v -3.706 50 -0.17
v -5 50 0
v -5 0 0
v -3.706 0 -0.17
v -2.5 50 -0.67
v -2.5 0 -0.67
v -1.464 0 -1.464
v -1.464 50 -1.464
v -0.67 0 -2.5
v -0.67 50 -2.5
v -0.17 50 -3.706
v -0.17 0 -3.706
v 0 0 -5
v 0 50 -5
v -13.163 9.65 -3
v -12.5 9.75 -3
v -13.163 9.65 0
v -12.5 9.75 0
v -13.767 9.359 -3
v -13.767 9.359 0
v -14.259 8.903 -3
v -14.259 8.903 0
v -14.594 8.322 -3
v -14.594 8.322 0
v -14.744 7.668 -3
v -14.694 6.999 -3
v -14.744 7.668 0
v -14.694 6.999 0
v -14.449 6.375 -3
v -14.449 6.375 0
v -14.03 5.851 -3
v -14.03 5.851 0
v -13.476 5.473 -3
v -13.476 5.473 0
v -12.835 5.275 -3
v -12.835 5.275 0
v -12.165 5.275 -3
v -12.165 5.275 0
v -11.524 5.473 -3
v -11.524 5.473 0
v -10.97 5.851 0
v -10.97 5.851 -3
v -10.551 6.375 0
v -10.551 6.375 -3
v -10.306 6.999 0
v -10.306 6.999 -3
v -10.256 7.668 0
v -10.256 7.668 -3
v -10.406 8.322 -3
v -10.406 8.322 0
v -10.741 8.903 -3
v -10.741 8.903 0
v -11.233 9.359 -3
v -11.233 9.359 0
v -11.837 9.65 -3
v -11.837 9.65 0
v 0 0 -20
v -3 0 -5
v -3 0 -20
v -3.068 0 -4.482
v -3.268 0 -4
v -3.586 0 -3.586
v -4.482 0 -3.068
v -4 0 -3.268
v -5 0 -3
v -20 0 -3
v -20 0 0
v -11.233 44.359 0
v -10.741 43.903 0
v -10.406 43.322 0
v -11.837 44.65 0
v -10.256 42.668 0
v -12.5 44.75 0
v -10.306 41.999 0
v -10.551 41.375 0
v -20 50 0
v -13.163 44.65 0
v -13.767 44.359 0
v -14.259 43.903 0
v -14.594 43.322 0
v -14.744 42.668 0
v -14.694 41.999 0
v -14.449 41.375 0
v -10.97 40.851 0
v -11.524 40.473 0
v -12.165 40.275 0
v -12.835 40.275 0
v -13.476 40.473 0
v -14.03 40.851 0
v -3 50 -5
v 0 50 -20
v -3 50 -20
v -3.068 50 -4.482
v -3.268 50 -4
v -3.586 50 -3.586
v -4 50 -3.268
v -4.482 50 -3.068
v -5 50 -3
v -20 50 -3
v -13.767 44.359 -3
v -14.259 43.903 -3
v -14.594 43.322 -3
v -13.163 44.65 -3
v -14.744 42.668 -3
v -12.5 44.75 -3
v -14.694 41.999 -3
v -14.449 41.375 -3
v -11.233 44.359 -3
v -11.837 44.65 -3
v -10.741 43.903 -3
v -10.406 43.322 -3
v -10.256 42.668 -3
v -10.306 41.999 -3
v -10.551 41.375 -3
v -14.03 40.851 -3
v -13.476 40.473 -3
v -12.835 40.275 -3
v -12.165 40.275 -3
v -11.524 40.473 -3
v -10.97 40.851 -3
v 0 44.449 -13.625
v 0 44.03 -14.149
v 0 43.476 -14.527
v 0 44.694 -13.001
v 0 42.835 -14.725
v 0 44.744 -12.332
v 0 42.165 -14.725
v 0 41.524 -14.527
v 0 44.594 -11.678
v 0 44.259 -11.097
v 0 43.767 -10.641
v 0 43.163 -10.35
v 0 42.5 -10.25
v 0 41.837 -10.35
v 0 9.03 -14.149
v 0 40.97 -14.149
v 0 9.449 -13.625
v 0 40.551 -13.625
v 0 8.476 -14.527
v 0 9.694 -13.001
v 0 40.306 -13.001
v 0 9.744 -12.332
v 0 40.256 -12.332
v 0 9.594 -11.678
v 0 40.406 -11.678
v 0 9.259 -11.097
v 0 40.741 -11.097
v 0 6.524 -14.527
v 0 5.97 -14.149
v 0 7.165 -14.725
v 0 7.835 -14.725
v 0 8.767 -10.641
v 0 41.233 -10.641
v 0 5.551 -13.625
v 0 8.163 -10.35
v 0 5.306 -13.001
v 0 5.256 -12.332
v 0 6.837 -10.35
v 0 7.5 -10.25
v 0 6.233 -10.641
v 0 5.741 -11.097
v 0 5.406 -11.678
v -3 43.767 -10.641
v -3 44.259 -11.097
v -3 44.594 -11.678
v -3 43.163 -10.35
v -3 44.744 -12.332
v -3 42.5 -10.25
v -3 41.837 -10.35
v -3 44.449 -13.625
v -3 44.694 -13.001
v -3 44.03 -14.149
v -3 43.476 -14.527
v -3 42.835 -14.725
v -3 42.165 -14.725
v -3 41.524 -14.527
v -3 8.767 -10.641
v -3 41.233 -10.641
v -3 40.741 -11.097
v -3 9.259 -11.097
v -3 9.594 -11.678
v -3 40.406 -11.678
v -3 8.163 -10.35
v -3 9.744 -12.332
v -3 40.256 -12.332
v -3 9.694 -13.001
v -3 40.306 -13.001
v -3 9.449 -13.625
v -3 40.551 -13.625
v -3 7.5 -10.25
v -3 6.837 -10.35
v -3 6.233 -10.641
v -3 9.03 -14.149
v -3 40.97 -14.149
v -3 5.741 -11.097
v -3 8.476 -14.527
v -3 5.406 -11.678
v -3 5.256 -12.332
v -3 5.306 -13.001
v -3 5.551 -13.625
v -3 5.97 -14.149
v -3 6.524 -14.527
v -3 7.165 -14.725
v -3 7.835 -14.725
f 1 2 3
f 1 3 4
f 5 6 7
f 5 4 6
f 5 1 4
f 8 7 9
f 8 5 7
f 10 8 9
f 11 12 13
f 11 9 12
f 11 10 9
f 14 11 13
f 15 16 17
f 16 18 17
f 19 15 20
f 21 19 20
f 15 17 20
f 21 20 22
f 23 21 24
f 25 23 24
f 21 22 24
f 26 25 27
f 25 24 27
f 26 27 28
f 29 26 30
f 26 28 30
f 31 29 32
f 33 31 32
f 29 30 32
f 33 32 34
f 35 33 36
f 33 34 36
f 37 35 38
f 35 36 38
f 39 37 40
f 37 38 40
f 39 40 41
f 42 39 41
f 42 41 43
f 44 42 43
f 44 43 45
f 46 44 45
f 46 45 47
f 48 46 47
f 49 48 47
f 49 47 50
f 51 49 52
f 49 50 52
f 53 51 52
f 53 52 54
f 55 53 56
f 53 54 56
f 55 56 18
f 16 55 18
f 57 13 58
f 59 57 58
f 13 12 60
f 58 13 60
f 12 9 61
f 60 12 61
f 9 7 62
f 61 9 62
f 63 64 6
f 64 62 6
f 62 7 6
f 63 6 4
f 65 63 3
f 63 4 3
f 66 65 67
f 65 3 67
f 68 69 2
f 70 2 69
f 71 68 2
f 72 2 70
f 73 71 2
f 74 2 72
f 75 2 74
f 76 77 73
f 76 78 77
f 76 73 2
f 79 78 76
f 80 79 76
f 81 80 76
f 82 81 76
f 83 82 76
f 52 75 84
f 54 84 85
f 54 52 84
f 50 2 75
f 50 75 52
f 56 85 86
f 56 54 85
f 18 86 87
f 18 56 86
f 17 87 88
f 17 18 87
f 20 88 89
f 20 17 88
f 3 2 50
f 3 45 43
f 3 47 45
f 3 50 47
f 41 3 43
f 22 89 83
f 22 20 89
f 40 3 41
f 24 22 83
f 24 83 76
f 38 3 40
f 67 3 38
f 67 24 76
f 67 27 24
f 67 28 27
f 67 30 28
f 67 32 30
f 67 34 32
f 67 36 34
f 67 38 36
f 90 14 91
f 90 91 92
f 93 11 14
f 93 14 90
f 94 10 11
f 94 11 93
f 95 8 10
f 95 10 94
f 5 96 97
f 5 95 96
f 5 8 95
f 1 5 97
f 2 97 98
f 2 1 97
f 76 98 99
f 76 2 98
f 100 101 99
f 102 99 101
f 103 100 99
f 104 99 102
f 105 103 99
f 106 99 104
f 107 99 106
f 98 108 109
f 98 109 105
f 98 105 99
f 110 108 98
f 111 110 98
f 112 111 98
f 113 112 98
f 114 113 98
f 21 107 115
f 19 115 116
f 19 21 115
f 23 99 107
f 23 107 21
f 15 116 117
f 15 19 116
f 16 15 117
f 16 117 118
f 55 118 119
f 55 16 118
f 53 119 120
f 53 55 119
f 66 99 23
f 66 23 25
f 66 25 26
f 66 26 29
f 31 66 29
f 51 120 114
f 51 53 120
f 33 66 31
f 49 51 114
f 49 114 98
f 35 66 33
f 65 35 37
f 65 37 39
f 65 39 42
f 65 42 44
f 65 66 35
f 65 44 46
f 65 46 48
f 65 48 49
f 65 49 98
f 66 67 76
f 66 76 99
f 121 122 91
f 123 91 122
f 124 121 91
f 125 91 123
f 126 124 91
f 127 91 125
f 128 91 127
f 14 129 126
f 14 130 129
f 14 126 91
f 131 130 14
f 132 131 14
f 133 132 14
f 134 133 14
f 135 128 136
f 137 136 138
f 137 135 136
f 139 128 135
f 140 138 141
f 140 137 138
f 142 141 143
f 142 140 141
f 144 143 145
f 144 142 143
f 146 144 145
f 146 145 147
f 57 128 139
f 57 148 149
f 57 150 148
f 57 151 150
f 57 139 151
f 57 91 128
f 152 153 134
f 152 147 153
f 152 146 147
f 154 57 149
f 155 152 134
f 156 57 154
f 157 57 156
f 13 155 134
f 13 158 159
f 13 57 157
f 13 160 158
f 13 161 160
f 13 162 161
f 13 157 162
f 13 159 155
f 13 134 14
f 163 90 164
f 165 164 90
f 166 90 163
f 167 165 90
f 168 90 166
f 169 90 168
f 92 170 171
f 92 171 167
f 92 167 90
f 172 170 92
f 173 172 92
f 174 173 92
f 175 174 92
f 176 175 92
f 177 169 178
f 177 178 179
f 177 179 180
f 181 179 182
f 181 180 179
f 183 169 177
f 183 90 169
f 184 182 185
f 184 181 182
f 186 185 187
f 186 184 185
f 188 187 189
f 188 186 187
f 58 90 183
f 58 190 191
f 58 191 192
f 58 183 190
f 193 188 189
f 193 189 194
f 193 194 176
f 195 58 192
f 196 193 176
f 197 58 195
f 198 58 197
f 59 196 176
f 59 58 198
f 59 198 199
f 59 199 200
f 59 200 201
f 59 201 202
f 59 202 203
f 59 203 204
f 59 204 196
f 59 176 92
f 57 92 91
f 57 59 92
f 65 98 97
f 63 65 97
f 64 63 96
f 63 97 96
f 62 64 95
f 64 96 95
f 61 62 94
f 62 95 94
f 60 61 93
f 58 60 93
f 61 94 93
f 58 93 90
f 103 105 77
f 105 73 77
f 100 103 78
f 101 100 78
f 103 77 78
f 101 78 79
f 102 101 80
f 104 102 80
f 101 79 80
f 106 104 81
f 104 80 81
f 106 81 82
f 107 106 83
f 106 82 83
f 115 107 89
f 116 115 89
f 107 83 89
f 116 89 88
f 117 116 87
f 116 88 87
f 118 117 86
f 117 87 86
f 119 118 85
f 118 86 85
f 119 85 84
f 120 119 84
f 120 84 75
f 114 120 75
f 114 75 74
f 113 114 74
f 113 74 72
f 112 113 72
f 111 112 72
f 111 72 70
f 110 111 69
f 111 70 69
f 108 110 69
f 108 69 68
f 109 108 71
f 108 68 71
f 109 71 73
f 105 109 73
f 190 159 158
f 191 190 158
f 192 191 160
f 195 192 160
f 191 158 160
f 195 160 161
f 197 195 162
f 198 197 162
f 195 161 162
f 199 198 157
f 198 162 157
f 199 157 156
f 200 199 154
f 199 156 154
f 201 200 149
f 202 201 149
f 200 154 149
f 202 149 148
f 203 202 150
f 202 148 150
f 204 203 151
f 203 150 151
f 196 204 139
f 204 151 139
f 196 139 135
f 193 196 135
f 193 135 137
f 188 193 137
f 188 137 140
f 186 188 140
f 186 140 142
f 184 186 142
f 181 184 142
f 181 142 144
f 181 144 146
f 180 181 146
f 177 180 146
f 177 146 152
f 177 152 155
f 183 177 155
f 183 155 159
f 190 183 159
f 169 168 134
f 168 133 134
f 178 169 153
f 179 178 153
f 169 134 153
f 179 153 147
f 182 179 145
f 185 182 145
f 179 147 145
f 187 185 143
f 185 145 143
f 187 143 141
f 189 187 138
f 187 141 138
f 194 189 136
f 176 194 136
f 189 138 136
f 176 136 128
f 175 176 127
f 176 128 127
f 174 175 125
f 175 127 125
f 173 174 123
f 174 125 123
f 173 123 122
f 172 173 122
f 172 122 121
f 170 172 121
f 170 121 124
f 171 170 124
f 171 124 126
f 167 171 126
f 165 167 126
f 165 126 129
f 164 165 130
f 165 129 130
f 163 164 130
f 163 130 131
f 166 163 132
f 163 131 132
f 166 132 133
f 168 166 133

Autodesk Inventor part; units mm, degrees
ref_plane "YZ Plane" through (0, 0, 0) normal (1, 0, 0) x (0, 1, 0)
ref_plane "XZ Plane" through (0, 0, 0) normal (0, 1, 0) x (-1, 0, 0)
ref_plane "XY Plane" through (0, 0, 0) normal (0, 0, 1) x (1, 0, 0)
sketch "Sketch1" plane through (0, 0, 0) normal (0, 1, 0) x (-1, 0, 0)
  line L0 (0, 0) -> (20, 0)
  line L1 (20, 0) -> (20, -3)
  line L2 (20, -3) -> (0, -3)
  line L3 (0, -3) -> (0, 0)
  line L4 (0, 0) -> (3, 0)
  line L5 (3, 0) -> (3, -20)
  line L6 (3, -20) -> (0, -20)
  line L7 (0, -20) -> (0, 0)
  dimension "d0" = 3
  dimension "d1" = 3
  dimension "d2" = 20
  dimension "d3" = 20
extrude "Extrusion1" add sketch "Sketch1" along normal blind 50
fillet "Fillet1" radius 2 1 edges at (-3, 25, -3)
fillet "Fillet2" radius 5 1 edges at (0, 25, 0)
sketch "Sketch2" plane through (-3, 0, -20) normal (-1, 0, 0) x (0, 0, 1)
  line L0 (0, 50) -> (15, 50) projected
  line L1 (0, 0) -> (15, 0) projected
  line L2 (0, 0) -> (0, 50) projected
  point P0 (20, 0)
  point P1 (7.5, 42.5)
  point P2 (7.5, 7.5)
  dimension "d8" = 7.5
  dimension "d9" = 7.5
  dimension "d10" = 35
  dimension "d11" = 7.5
hole "Hole1" at (-3, 42.5, -12.5) at (-3, 7.5, -12.5) direction (1, 0, 0) diameter 4.5 end through all clearance for "Socket Head Cap Screw" size "M4" standard "Ansi Metric M Profile"
sketch "Sketch3" plane through (-20, 0, -3) normal (0, 0, -1) x (-1, 0, 0)
  line L0 (-15, 50) -> (0, 50) projected
  line L1 (-15, 0) -> (0, 0) projected
  line L2 (0, 0) -> (0, 50) projected
  point P0 (-20, 0)
  point P1 (-7.5, 42.5)
  point P2 (-7.5, 7.5)
  dimension "d19" = 7.5
  dimension "d20" = 7.5
  dimension "d21" = 7.5
hole "Hole2" at (-12.5, 42.5, -3) at (-12.5, 7.5, -3) direction (0, 0, 1) diameter 4.5 end through all clearance for "Socket Head Cap Screw" size "M4" standard "Ansi Metric M Profile"
equation "\"d1\" = d0"
equation "\"d3\" = d2"
equation "\"d9\" = d8"
equation "\"d20\" = d19"
equation "\"d21\" = d19"
properties part number "Pancake_Angle Bracket" material "Aluminum 6061"
